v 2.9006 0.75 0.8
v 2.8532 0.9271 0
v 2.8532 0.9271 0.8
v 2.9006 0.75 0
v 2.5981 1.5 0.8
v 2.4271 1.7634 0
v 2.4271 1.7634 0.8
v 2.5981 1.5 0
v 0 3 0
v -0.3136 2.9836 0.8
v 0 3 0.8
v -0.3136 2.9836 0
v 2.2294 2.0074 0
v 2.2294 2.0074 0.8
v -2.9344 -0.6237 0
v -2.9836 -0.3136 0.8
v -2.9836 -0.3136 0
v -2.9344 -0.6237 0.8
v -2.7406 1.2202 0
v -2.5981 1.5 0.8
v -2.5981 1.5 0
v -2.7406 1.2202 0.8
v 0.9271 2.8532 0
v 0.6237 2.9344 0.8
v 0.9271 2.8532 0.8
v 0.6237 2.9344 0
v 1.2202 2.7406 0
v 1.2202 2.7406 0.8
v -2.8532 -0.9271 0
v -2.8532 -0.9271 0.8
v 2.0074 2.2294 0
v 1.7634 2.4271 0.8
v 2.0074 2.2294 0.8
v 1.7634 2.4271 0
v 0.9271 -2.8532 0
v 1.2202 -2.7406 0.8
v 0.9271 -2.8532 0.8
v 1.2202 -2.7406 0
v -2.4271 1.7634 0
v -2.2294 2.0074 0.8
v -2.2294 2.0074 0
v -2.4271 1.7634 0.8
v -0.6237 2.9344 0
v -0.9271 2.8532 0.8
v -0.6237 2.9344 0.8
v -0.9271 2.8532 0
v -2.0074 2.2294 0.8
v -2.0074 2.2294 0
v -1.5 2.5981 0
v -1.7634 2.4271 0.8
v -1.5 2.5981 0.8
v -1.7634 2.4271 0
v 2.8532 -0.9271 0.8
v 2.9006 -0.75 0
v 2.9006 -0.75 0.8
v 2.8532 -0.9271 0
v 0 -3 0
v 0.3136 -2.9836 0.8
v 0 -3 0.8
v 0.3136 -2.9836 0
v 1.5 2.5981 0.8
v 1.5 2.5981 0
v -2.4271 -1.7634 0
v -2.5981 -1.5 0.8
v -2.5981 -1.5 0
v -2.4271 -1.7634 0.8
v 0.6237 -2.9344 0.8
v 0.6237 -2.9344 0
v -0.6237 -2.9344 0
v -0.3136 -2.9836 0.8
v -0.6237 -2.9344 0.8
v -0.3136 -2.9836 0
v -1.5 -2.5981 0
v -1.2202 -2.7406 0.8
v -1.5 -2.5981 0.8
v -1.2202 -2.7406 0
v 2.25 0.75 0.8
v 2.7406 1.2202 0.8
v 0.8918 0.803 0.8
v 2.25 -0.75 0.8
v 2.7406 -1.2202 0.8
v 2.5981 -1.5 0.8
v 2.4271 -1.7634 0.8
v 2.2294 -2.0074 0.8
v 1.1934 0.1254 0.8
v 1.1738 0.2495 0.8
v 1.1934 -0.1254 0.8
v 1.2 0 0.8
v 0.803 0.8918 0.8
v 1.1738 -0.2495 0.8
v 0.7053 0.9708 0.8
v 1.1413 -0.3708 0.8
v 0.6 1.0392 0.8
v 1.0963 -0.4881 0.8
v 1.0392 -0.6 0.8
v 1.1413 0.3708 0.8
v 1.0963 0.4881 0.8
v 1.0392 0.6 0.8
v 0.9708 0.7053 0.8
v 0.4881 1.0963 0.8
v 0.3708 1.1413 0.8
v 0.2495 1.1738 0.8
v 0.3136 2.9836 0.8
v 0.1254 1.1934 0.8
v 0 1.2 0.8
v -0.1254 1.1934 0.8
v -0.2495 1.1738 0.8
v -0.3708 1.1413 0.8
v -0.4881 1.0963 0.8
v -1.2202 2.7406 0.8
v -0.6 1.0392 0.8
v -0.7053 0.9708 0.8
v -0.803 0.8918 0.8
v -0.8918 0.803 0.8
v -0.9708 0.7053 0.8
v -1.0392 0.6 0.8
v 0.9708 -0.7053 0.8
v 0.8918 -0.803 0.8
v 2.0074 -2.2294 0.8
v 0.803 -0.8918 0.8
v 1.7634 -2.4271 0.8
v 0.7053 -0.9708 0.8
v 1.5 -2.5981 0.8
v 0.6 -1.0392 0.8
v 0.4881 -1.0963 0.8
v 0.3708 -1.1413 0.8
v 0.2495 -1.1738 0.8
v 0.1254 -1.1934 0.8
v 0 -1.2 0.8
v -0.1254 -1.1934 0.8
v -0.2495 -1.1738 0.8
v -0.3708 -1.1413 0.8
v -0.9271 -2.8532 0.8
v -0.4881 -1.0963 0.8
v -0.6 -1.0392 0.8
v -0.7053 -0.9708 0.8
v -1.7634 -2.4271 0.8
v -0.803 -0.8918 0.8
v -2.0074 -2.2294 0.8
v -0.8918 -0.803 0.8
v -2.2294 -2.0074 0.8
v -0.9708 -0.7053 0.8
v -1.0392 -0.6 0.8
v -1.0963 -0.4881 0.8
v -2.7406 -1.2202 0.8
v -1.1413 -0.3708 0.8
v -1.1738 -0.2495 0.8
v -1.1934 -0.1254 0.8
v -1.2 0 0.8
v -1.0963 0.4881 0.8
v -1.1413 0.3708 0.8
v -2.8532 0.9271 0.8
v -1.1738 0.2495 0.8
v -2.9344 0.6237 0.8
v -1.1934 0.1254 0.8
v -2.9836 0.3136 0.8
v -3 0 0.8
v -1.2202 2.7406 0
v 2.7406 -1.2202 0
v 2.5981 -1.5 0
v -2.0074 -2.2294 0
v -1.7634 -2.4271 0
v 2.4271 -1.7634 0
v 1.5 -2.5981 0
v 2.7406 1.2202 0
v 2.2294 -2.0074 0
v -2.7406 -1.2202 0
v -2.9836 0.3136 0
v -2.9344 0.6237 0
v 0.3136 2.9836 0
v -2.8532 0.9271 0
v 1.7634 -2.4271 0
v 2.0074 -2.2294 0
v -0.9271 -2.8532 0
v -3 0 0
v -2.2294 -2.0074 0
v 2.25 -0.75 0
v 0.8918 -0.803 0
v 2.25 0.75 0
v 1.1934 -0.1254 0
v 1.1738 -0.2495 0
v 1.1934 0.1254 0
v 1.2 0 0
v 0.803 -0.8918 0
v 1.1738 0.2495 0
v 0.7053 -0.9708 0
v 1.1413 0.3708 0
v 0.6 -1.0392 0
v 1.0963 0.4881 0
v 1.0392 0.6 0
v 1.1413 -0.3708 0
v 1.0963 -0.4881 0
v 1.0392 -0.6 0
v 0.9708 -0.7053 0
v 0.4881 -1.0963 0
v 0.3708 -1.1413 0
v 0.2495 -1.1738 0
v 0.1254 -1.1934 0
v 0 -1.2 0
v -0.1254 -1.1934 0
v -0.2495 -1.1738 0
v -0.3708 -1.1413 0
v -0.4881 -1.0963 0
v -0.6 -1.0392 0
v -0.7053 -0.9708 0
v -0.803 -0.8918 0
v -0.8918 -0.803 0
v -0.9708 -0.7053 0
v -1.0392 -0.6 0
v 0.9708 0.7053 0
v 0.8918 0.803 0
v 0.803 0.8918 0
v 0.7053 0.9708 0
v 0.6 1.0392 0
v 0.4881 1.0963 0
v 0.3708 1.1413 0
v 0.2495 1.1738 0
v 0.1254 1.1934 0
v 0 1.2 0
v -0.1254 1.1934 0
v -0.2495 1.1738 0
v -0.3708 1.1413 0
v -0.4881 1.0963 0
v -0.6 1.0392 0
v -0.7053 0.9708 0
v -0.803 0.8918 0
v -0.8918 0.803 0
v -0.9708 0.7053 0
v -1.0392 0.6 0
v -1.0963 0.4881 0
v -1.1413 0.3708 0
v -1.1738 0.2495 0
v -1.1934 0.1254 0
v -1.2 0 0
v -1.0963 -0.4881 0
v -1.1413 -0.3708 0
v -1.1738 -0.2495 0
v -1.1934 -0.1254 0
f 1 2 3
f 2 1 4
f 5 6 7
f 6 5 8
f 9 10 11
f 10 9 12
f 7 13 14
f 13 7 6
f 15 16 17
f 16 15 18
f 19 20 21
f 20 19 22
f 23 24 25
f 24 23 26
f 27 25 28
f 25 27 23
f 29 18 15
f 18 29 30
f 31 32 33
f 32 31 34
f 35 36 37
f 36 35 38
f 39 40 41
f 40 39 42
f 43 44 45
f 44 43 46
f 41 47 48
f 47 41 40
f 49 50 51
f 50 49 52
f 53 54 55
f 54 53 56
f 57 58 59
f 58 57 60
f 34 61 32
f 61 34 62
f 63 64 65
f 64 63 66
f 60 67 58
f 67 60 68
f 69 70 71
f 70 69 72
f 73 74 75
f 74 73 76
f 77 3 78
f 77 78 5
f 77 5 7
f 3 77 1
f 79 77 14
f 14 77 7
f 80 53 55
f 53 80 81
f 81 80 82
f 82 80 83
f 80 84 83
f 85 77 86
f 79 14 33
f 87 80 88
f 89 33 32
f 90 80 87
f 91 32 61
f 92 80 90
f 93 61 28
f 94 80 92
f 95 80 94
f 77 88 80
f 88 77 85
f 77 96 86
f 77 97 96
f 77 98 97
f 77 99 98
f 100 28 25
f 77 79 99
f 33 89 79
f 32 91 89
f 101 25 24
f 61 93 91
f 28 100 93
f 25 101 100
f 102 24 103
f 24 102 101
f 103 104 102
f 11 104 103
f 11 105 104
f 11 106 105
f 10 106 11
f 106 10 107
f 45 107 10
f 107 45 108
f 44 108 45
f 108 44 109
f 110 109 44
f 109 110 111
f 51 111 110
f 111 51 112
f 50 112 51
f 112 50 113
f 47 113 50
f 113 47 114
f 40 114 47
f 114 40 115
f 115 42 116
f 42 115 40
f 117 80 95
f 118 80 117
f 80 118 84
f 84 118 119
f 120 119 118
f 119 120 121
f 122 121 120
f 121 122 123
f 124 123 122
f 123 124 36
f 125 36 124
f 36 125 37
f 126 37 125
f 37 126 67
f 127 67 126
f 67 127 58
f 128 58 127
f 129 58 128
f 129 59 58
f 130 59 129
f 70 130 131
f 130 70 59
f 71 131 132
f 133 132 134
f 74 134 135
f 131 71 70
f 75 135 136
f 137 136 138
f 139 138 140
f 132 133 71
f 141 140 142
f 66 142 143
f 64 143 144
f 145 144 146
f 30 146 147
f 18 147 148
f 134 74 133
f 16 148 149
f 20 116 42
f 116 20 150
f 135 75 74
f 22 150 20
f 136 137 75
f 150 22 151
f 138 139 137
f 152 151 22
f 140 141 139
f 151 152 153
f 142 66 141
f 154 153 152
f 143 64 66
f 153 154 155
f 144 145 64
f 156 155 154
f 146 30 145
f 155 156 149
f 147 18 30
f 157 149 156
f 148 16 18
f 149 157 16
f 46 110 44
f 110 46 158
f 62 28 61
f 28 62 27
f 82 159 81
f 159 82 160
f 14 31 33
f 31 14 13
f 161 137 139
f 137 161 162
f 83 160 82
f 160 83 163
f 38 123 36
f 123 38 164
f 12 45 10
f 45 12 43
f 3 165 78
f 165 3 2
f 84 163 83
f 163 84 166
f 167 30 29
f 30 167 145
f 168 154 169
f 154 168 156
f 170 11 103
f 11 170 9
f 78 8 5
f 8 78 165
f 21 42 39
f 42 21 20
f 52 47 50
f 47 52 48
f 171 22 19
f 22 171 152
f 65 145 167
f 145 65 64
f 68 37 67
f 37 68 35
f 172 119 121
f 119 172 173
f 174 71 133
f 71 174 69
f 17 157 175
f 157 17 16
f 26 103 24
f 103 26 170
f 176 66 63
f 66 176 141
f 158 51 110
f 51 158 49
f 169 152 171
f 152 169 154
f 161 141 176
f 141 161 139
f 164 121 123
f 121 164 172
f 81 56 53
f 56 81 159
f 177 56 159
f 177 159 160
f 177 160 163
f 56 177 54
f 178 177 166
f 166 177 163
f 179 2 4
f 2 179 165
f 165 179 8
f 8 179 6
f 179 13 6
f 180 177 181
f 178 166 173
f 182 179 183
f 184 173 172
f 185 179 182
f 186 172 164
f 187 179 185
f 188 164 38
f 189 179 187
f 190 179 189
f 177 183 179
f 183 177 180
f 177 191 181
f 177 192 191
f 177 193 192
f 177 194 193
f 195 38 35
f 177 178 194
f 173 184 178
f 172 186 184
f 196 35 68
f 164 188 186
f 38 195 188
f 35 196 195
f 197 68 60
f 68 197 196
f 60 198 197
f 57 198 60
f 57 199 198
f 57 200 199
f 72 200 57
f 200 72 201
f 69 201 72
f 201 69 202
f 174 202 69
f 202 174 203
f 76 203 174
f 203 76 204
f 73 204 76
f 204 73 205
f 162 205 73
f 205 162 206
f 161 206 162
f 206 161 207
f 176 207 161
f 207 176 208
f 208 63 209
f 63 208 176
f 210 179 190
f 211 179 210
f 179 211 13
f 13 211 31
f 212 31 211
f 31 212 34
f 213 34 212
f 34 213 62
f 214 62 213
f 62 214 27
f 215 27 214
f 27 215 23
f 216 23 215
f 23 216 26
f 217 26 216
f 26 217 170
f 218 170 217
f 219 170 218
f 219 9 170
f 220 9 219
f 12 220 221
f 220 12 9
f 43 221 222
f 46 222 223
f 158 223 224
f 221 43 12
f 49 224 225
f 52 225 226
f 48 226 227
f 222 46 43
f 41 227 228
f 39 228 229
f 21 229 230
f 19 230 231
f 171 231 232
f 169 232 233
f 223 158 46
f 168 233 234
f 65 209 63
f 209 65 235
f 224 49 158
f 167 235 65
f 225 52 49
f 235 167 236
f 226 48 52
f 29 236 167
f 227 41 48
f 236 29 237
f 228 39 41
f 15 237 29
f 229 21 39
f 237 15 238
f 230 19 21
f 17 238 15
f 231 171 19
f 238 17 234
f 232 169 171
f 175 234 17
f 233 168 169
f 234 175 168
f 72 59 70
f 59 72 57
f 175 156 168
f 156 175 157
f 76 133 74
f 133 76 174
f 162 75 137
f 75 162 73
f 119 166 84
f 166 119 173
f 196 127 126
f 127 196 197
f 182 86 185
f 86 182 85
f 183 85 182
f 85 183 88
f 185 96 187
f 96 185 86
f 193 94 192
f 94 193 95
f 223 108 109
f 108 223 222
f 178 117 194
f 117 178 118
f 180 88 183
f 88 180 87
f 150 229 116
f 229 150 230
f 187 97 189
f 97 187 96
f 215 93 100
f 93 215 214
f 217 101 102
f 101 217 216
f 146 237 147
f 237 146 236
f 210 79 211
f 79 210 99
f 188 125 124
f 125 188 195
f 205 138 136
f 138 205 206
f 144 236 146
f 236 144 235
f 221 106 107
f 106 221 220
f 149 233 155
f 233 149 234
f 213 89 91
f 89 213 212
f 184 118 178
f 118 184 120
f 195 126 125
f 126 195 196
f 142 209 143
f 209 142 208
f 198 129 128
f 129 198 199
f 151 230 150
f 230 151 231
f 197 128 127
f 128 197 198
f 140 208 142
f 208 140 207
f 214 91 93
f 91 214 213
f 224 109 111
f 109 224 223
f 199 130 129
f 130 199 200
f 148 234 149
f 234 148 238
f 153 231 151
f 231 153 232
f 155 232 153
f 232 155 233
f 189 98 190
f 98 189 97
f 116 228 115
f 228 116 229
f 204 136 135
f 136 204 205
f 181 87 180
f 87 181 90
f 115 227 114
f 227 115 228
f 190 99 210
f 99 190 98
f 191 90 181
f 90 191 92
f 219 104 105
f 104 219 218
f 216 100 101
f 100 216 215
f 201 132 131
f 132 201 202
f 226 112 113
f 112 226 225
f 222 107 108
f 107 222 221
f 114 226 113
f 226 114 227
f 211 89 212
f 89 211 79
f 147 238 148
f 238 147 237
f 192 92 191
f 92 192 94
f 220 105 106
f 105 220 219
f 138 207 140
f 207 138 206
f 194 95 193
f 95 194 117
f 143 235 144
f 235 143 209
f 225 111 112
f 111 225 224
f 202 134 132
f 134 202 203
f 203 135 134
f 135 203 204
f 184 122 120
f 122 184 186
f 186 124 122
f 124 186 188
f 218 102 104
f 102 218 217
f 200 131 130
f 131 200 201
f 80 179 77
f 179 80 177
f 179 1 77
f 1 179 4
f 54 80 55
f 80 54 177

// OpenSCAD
// Split lock washer.
$fn = 60;
eps = 0.02;
inner_d = 2.4;
outer_d = 6;
thickness = 0.8;
gap = 1.5;
difference() {
    cylinder(d=outer_d,h=thickness);
    translate([0,0,-eps]) cylinder(d=inner_d,h=thickness+2*eps);
    translate([outer_d/2-gap/2,-gap/2,-eps]) cube([gap+eps,gap,thickness+2*eps]);
}
